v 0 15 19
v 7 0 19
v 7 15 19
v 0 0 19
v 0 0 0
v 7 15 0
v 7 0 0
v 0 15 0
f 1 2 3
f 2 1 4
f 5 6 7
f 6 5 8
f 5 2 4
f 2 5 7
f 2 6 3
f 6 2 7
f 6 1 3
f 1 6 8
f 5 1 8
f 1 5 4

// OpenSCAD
// Generated by SolidPython 1.0.1 on 2020-07-29 00:46:55


cube(size = [7, 15, 19]);
/***********************************************
*********      SolidPython code:      **********
************************************************
 
# import packages: SolidPython
from solid import *
from solid.utils import *
from itertools import chain, combinations, permutations


class Resize:

    def __init__(self, scad_file):
        self.scad_file = scad_file
        #self.scad_file = import_scad(scad_file)
        # cone/cylinder param:
        self.r1 = 0
        self.r2 = 0
        self.h = 0
        # rectangular prism param:
        self.w = 0
        self.l = 0
        # ellipse param:
        self.r = 0

    # import OpenScad code (file name corresponds to shape)


    # classify shape + parameters
    def assign(self, param1, param2, param3):
        if self.scad_file == 'cone.scad':
            self.r1 = param1
            self.r2 = param2
            self.h = param3
        elif self.scad_file == 'cylinder.scad':
            self.r1 = param1
            self.r2 = param2
            self.h = param3
        elif self.scad_file == 'rectangularPrism.scad':
            self.h = param1
            self.l = param2
            self.w = param3
        else:
            self.r = param1
            self.h = param2

    # resize parameters
    def iterate(self):
        x = range(3, 20, 2)
        i = 1
        if self.scad_file == 'cone.scad':
            tempList = list(permutations(x, 2))
            for temp in tempList:
                param1 = temp[0]
                param2 = temp[1]
                filepath = 'produced_scad_files/' + 'cone' + str(param1) + '_' + str(param2) + '_' + '.scad'
                scad_render_to_file(cylinder(h=param1, r1=param2, r2=0), filepath)

        elif self.scad_file == 'cylinder.scad':
            tempList = list(permutations(x, 3))
            for temp in tempList:
                param1 = temp[0]
                param2 = temp[1]
                filepath = 'produced_scad_files/' + 'cylinder' + str(param1) + '_' + str(param2) + '_' + '.scad'
                scad_render_to_file(cylinder(h=param1, r1=param2, r2=param2), filepath)

        elif self.scad_file == 'rectangularPrism.scad':
            tempList = list(permutations(x, 3))
            for temp in tempList:
                param1 = temp[0]
                param2 = temp[1]
                param3 = temp[2]
                filepath = 'produced_scad_files/' + 'rectangularPrism' + str(param1) + '_' + str(param2) + '_' + str(
                    param3) + '.scad'
                scad_render_to_file(cube(size=(param1, param2, param3)), filepath)

        elif self.scad_file == 'ellipse.scad':
            tempList = list(permutations(x, 4))
            for temp in tempList:
                param1 = temp[0]
                param2 = temp[1]
                param3 = temp[2]
                param4 = temp[3]
                filepath = 'produced_scad_files/' + 'ellipse' + str(param1) + '_' + str(param2) + '_' + str(param3) + '_' + str(param4) + '.scad'
                scad_render_to_file(scale([param1, param2, param3])(sphere(r=param4)), filepath)

    def render_to_scadfile(self):
        scad_render_to_file(scad, 'example.scad') 
 
************************************************/
